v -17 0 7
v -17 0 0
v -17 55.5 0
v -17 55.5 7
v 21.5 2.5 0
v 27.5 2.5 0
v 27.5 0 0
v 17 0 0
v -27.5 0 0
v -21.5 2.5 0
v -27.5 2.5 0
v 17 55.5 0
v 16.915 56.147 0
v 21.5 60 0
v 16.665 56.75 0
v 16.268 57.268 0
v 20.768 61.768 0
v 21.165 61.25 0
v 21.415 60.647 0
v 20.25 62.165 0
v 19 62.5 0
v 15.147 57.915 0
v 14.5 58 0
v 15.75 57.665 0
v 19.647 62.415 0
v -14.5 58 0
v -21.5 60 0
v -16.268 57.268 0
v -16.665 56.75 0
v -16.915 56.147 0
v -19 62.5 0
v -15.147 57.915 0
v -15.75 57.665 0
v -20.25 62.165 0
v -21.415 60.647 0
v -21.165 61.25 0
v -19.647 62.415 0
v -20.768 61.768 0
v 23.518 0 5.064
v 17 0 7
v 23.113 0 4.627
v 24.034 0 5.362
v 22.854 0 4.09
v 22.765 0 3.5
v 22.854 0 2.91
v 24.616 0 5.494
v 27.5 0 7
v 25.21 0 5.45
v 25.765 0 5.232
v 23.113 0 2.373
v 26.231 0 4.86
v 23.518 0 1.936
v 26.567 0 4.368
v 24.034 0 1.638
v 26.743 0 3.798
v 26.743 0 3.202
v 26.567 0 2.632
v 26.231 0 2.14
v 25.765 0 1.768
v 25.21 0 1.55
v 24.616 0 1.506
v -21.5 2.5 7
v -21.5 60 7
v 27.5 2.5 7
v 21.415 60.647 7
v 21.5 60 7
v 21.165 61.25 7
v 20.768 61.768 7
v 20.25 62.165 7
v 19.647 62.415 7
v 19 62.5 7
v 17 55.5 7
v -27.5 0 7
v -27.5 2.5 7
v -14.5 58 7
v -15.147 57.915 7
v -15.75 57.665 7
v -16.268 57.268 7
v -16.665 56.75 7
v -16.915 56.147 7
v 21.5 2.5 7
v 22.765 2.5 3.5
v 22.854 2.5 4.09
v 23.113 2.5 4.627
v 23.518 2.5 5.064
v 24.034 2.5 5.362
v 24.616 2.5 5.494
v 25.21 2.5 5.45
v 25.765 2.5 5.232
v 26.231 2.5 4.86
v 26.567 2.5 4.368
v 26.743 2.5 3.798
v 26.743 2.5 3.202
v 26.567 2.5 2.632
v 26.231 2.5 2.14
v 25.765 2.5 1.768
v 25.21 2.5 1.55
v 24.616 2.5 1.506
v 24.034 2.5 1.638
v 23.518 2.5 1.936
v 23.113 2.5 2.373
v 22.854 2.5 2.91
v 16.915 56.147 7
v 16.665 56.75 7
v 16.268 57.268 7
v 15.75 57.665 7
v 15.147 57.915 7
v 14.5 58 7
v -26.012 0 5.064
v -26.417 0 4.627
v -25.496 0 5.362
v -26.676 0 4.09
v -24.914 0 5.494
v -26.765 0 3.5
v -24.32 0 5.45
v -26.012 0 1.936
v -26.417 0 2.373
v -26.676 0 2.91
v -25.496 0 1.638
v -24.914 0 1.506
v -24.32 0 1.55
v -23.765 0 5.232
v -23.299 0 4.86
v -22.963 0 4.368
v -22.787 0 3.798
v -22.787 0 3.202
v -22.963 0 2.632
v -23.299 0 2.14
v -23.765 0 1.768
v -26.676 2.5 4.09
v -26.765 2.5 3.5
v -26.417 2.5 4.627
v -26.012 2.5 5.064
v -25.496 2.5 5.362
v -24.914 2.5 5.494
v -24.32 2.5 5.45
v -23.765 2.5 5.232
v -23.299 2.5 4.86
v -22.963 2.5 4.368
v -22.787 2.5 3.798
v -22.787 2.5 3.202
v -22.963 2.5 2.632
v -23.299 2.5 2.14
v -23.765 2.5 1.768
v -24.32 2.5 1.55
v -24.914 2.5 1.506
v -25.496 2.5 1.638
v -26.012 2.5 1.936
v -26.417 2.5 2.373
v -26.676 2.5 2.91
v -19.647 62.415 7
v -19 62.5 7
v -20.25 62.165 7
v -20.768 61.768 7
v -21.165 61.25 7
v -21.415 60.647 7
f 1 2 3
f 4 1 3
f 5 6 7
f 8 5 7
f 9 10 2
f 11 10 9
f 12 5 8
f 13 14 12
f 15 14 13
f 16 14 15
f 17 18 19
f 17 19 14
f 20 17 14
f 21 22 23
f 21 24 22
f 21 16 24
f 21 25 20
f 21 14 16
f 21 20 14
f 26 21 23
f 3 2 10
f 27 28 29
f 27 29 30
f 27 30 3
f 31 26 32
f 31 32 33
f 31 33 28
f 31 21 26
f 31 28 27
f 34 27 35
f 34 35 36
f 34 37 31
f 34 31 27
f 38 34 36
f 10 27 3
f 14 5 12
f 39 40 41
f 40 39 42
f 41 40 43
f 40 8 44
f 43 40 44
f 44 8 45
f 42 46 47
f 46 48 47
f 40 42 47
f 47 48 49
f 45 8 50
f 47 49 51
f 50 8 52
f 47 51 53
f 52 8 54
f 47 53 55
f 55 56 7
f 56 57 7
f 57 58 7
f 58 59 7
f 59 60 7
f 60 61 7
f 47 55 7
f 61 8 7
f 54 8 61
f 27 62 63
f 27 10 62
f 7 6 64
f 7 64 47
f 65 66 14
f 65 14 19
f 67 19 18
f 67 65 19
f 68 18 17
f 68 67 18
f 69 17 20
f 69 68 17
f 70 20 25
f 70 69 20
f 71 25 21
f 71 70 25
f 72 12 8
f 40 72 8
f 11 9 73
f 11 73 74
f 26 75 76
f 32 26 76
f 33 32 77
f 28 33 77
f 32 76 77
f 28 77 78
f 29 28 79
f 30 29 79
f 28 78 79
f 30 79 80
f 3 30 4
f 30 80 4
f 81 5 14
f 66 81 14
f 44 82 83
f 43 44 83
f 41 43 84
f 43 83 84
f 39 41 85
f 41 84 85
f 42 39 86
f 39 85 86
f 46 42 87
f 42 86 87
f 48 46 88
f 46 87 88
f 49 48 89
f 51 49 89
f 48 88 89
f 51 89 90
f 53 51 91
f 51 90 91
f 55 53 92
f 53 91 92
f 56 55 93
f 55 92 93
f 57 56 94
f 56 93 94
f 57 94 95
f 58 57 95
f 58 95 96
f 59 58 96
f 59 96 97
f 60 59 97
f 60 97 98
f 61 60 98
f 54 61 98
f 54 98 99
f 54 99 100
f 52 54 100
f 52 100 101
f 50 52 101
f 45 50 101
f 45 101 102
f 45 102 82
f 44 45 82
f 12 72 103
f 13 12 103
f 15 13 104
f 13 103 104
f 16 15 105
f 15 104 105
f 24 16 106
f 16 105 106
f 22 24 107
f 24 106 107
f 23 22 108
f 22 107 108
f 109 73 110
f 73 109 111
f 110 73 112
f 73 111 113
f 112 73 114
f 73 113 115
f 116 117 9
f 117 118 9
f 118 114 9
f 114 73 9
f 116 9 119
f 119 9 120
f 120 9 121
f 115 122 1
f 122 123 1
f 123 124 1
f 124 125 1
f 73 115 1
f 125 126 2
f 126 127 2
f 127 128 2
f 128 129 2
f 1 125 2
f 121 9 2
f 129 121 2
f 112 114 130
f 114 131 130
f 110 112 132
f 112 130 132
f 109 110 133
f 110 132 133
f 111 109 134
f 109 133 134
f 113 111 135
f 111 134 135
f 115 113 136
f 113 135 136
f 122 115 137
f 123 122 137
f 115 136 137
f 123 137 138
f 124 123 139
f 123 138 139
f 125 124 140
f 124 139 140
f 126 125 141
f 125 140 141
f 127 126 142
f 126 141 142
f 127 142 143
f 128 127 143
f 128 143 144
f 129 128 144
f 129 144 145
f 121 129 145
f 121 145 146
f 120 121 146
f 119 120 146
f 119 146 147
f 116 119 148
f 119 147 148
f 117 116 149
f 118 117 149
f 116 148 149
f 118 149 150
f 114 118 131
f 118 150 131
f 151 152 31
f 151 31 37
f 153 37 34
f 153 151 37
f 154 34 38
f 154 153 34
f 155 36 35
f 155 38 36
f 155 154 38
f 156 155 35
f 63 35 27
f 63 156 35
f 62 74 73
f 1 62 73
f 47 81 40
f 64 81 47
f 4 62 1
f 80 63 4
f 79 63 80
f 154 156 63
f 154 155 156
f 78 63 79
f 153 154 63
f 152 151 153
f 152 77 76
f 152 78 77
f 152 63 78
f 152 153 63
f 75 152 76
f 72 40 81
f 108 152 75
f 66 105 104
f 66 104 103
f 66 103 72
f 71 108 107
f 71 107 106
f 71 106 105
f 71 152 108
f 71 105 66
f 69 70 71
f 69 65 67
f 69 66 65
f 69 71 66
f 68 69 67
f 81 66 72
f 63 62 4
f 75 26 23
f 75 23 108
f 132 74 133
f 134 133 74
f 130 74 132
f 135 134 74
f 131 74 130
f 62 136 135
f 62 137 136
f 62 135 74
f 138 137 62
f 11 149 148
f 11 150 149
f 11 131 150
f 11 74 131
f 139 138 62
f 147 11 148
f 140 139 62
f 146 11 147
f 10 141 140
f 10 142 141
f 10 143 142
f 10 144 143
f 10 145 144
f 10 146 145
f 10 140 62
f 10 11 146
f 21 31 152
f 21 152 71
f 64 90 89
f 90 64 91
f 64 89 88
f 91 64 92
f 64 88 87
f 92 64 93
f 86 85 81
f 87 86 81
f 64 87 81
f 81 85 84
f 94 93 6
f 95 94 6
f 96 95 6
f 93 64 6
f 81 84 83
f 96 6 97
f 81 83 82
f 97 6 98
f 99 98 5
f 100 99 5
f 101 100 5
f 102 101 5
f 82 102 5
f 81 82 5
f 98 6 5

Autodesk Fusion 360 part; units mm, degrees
sketch "Sketch1" plane through (0, 0, 0) normal (0, 0, 1) x (1, 0, 0)
  line L0 (-27.5, 0) -> (27.5, 0)
  line L1 (-27.5, 0) -> (-27.5, 2.5)
  line L2 (-27.5, 2.5) -> (-21.5, 2.5)
  line L3 (0, 0) -> (0, 60)
  line L4 (27.5, 2.5) -> (21.5, 2.5)
  line L5 (0, 2.5) -> (-14, 2.5)
  line L6 (0, 2.5) -> (14, 2.5)
  line L7 (-14, 0) -> (-14, 2.5)
  line L8 (14, 2.5) -> (14, 0)
  line L9 (-14, 2.5) -> (-14, 62.5)
  line L10 (14, 2.5) -> (14, 62.5)
  line L11 (-21.5, 2.5) -> (-21.5, 62.5)
  line L12 (21.5, 2.5) -> (21.5, 62.5)
  line L13 (-21.5, 62.5) -> (21.5, 62.5)
  line L14 (0, 60) -> (-14, 60)
  line L15 (0, 60) -> (14, 60)
  line L16 (27.5, 2.5) -> (27.5, 0)
  dimension "d8" = 55
  dimension "d9" = 6
  dimension "d10" = 60
  dimension "d11" = 60
  dimension "d12" = 60
extrude "Extrude1" add sketch "Sketch1" along normal blind 7 contours L0 L1 L2 L7 L9 L11 L13 | L0 L4 L8 L10 L12 L13 L16 | L9 L10 L13 L14 L15
extrude "Extrude2" add 2 faces at (-4.6667, 60, 2.3333) (4.6667, 60, 2.3333) along direction (0, -1, 0) blind 2
sketch "Sketch2" plane through (0, 62.5, 0) normal (0, 1, 0) x (-1, 0, 0)
  line L0 (-21.5, 0) -> (21.5, 0)
  line L1 (21.5, 0) -> (21.5, 7)
  line L2 (21.5, 7) -> (-21.5, 7)
  line L3 (-21.5, 7) -> (-21.5, 0)
  line L4 (0, 3.5) -> (24.765, 3.5)
  line L5 (0, 0) -> (0, 7)
  line L6 (0, 3.5) -> (-24.765, 3.5)
  circle A0 centre (24.765, 3.5) radius 2
  circle A1 centre (-24.765, 3.5) radius 2
  dimension "d17" = 24.765
  dimension "d18" = 4
  dimension "d19" = 4
extrude "Extrude3" cut sketch "Sketch2" against normal blind 66 contours A0 | A1
extrude "Extrude4" cut 1 faces at (-14, 19.3333, 4.6667) along direction (-1, 0, 0) blind 3
extrude "Extrude5" cut 1 faces at (14, 19.3333, 4.6667) along direction (1, 0, 0) blind 3
fillet "Fillet1" radius 2.5 1 edges at (-17, 58, 3.5)
fillet "Fillet2" radius 2.5 1 edges at (17, 58, 3.5)
fillet "Fillet3" radius 2.5 1 edges at (-21.5, 62.5, 3.5)
fillet "Fillet4" radius 2.5 1 edges at (21.5, 62.5, 3.5)
